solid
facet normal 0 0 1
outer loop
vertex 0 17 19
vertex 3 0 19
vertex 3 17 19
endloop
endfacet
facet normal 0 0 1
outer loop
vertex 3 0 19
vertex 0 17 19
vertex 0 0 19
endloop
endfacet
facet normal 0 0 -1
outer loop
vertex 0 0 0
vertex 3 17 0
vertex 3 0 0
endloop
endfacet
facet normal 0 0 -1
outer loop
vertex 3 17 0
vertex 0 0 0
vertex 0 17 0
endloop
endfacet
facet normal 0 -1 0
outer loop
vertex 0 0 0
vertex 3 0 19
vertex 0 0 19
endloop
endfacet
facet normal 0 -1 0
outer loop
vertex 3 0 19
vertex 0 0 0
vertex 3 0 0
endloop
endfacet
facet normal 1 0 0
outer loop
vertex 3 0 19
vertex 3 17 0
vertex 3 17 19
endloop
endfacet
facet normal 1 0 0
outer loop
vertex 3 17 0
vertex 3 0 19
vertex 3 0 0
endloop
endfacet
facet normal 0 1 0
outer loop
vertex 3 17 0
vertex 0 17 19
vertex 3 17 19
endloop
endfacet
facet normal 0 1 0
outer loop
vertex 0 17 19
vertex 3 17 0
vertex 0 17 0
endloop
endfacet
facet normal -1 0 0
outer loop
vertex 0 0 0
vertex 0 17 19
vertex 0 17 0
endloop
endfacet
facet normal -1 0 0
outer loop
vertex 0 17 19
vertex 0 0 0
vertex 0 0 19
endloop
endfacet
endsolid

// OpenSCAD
// Generated by SolidPython 1.0.1 on 2020-07-29 00:46:54


cube(size = [3, 17, 19]);
/***********************************************
*********      SolidPython code:      **********
************************************************
 
# import packages: SolidPython
from solid import *
from solid.utils import *
from itertools import chain, combinations, permutations


class Resize:

    def __init__(self, scad_file):
        self.scad_file = scad_file
        #self.scad_file = import_scad(scad_file)
        # cone/cylinder param:
        self.r1 = 0
        self.r2 = 0
        self.h = 0
        # rectangular prism param:
        self.w = 0
        self.l = 0
        # ellipse param:
        self.r = 0

    # import OpenScad code (file name corresponds to shape)


    # classify shape + parameters
    def assign(self, param1, param2, param3):
        if self.scad_file == 'cone.scad':
            self.r1 = param1
            self.r2 = param2
            self.h = param3
        elif self.scad_file == 'cylinder.scad':
            self.r1 = param1
            self.r2 = param2
            self.h = param3
        elif self.scad_file == 'rectangularPrism.scad':
            self.h = param1
            self.l = param2
            self.w = param3
        else:
            self.r = param1
            self.h = param2

    # resize parameters
    def iterate(self):
        x = range(3, 20, 2)
        i = 1
        if self.scad_file == 'cone.scad':
            tempList = list(permutations(x, 2))
            for temp in tempList:
                param1 = temp[0]
                param2 = temp[1]
                filepath = 'produced_scad_files/' + 'cone' + str(param1) + '_' + str(param2) + '_' + '.scad'
                scad_render_to_file(cylinder(h=param1, r1=param2, r2=0), filepath)

        elif self.scad_file == 'cylinder.scad':
            tempList = list(permutations(x, 3))
            for temp in tempList:
                param1 = temp[0]
                param2 = temp[1]
                filepath = 'produced_scad_files/' + 'cylinder' + str(param1) + '_' + str(param2) + '_' + '.scad'
                scad_render_to_file(cylinder(h=param1, r1=param2, r2=param2), filepath)

        elif self.scad_file == 'rectangularPrism.scad':
            tempList = list(permutations(x, 3))
            for temp in tempList:
                param1 = temp[0]
                param2 = temp[1]
                param3 = temp[2]
                filepath = 'produced_scad_files/' + 'rectangularPrism' + str(param1) + '_' + str(param2) + '_' + str(
                    param3) + '.scad'
                scad_render_to_file(cube(size=(param1, param2, param3)), filepath)

        elif self.scad_file == 'ellipse.scad':
            tempList = list(permutations(x, 4))
            for temp in tempList:
                param1 = temp[0]
                param2 = temp[1]
                param3 = temp[2]
                param4 = temp[3]
                filepath = 'produced_scad_files/' + 'ellipse' + str(param1) + '_' + str(param2) + '_' + str(param3) + '_' + str(param4) + '.scad'
                scad_render_to_file(scale([param1, param2, param3])(sphere(r=param4)), filepath)

    def render_to_scadfile(self):
        scad_render_to_file(scad, 'example.scad') 
 
************************************************/
